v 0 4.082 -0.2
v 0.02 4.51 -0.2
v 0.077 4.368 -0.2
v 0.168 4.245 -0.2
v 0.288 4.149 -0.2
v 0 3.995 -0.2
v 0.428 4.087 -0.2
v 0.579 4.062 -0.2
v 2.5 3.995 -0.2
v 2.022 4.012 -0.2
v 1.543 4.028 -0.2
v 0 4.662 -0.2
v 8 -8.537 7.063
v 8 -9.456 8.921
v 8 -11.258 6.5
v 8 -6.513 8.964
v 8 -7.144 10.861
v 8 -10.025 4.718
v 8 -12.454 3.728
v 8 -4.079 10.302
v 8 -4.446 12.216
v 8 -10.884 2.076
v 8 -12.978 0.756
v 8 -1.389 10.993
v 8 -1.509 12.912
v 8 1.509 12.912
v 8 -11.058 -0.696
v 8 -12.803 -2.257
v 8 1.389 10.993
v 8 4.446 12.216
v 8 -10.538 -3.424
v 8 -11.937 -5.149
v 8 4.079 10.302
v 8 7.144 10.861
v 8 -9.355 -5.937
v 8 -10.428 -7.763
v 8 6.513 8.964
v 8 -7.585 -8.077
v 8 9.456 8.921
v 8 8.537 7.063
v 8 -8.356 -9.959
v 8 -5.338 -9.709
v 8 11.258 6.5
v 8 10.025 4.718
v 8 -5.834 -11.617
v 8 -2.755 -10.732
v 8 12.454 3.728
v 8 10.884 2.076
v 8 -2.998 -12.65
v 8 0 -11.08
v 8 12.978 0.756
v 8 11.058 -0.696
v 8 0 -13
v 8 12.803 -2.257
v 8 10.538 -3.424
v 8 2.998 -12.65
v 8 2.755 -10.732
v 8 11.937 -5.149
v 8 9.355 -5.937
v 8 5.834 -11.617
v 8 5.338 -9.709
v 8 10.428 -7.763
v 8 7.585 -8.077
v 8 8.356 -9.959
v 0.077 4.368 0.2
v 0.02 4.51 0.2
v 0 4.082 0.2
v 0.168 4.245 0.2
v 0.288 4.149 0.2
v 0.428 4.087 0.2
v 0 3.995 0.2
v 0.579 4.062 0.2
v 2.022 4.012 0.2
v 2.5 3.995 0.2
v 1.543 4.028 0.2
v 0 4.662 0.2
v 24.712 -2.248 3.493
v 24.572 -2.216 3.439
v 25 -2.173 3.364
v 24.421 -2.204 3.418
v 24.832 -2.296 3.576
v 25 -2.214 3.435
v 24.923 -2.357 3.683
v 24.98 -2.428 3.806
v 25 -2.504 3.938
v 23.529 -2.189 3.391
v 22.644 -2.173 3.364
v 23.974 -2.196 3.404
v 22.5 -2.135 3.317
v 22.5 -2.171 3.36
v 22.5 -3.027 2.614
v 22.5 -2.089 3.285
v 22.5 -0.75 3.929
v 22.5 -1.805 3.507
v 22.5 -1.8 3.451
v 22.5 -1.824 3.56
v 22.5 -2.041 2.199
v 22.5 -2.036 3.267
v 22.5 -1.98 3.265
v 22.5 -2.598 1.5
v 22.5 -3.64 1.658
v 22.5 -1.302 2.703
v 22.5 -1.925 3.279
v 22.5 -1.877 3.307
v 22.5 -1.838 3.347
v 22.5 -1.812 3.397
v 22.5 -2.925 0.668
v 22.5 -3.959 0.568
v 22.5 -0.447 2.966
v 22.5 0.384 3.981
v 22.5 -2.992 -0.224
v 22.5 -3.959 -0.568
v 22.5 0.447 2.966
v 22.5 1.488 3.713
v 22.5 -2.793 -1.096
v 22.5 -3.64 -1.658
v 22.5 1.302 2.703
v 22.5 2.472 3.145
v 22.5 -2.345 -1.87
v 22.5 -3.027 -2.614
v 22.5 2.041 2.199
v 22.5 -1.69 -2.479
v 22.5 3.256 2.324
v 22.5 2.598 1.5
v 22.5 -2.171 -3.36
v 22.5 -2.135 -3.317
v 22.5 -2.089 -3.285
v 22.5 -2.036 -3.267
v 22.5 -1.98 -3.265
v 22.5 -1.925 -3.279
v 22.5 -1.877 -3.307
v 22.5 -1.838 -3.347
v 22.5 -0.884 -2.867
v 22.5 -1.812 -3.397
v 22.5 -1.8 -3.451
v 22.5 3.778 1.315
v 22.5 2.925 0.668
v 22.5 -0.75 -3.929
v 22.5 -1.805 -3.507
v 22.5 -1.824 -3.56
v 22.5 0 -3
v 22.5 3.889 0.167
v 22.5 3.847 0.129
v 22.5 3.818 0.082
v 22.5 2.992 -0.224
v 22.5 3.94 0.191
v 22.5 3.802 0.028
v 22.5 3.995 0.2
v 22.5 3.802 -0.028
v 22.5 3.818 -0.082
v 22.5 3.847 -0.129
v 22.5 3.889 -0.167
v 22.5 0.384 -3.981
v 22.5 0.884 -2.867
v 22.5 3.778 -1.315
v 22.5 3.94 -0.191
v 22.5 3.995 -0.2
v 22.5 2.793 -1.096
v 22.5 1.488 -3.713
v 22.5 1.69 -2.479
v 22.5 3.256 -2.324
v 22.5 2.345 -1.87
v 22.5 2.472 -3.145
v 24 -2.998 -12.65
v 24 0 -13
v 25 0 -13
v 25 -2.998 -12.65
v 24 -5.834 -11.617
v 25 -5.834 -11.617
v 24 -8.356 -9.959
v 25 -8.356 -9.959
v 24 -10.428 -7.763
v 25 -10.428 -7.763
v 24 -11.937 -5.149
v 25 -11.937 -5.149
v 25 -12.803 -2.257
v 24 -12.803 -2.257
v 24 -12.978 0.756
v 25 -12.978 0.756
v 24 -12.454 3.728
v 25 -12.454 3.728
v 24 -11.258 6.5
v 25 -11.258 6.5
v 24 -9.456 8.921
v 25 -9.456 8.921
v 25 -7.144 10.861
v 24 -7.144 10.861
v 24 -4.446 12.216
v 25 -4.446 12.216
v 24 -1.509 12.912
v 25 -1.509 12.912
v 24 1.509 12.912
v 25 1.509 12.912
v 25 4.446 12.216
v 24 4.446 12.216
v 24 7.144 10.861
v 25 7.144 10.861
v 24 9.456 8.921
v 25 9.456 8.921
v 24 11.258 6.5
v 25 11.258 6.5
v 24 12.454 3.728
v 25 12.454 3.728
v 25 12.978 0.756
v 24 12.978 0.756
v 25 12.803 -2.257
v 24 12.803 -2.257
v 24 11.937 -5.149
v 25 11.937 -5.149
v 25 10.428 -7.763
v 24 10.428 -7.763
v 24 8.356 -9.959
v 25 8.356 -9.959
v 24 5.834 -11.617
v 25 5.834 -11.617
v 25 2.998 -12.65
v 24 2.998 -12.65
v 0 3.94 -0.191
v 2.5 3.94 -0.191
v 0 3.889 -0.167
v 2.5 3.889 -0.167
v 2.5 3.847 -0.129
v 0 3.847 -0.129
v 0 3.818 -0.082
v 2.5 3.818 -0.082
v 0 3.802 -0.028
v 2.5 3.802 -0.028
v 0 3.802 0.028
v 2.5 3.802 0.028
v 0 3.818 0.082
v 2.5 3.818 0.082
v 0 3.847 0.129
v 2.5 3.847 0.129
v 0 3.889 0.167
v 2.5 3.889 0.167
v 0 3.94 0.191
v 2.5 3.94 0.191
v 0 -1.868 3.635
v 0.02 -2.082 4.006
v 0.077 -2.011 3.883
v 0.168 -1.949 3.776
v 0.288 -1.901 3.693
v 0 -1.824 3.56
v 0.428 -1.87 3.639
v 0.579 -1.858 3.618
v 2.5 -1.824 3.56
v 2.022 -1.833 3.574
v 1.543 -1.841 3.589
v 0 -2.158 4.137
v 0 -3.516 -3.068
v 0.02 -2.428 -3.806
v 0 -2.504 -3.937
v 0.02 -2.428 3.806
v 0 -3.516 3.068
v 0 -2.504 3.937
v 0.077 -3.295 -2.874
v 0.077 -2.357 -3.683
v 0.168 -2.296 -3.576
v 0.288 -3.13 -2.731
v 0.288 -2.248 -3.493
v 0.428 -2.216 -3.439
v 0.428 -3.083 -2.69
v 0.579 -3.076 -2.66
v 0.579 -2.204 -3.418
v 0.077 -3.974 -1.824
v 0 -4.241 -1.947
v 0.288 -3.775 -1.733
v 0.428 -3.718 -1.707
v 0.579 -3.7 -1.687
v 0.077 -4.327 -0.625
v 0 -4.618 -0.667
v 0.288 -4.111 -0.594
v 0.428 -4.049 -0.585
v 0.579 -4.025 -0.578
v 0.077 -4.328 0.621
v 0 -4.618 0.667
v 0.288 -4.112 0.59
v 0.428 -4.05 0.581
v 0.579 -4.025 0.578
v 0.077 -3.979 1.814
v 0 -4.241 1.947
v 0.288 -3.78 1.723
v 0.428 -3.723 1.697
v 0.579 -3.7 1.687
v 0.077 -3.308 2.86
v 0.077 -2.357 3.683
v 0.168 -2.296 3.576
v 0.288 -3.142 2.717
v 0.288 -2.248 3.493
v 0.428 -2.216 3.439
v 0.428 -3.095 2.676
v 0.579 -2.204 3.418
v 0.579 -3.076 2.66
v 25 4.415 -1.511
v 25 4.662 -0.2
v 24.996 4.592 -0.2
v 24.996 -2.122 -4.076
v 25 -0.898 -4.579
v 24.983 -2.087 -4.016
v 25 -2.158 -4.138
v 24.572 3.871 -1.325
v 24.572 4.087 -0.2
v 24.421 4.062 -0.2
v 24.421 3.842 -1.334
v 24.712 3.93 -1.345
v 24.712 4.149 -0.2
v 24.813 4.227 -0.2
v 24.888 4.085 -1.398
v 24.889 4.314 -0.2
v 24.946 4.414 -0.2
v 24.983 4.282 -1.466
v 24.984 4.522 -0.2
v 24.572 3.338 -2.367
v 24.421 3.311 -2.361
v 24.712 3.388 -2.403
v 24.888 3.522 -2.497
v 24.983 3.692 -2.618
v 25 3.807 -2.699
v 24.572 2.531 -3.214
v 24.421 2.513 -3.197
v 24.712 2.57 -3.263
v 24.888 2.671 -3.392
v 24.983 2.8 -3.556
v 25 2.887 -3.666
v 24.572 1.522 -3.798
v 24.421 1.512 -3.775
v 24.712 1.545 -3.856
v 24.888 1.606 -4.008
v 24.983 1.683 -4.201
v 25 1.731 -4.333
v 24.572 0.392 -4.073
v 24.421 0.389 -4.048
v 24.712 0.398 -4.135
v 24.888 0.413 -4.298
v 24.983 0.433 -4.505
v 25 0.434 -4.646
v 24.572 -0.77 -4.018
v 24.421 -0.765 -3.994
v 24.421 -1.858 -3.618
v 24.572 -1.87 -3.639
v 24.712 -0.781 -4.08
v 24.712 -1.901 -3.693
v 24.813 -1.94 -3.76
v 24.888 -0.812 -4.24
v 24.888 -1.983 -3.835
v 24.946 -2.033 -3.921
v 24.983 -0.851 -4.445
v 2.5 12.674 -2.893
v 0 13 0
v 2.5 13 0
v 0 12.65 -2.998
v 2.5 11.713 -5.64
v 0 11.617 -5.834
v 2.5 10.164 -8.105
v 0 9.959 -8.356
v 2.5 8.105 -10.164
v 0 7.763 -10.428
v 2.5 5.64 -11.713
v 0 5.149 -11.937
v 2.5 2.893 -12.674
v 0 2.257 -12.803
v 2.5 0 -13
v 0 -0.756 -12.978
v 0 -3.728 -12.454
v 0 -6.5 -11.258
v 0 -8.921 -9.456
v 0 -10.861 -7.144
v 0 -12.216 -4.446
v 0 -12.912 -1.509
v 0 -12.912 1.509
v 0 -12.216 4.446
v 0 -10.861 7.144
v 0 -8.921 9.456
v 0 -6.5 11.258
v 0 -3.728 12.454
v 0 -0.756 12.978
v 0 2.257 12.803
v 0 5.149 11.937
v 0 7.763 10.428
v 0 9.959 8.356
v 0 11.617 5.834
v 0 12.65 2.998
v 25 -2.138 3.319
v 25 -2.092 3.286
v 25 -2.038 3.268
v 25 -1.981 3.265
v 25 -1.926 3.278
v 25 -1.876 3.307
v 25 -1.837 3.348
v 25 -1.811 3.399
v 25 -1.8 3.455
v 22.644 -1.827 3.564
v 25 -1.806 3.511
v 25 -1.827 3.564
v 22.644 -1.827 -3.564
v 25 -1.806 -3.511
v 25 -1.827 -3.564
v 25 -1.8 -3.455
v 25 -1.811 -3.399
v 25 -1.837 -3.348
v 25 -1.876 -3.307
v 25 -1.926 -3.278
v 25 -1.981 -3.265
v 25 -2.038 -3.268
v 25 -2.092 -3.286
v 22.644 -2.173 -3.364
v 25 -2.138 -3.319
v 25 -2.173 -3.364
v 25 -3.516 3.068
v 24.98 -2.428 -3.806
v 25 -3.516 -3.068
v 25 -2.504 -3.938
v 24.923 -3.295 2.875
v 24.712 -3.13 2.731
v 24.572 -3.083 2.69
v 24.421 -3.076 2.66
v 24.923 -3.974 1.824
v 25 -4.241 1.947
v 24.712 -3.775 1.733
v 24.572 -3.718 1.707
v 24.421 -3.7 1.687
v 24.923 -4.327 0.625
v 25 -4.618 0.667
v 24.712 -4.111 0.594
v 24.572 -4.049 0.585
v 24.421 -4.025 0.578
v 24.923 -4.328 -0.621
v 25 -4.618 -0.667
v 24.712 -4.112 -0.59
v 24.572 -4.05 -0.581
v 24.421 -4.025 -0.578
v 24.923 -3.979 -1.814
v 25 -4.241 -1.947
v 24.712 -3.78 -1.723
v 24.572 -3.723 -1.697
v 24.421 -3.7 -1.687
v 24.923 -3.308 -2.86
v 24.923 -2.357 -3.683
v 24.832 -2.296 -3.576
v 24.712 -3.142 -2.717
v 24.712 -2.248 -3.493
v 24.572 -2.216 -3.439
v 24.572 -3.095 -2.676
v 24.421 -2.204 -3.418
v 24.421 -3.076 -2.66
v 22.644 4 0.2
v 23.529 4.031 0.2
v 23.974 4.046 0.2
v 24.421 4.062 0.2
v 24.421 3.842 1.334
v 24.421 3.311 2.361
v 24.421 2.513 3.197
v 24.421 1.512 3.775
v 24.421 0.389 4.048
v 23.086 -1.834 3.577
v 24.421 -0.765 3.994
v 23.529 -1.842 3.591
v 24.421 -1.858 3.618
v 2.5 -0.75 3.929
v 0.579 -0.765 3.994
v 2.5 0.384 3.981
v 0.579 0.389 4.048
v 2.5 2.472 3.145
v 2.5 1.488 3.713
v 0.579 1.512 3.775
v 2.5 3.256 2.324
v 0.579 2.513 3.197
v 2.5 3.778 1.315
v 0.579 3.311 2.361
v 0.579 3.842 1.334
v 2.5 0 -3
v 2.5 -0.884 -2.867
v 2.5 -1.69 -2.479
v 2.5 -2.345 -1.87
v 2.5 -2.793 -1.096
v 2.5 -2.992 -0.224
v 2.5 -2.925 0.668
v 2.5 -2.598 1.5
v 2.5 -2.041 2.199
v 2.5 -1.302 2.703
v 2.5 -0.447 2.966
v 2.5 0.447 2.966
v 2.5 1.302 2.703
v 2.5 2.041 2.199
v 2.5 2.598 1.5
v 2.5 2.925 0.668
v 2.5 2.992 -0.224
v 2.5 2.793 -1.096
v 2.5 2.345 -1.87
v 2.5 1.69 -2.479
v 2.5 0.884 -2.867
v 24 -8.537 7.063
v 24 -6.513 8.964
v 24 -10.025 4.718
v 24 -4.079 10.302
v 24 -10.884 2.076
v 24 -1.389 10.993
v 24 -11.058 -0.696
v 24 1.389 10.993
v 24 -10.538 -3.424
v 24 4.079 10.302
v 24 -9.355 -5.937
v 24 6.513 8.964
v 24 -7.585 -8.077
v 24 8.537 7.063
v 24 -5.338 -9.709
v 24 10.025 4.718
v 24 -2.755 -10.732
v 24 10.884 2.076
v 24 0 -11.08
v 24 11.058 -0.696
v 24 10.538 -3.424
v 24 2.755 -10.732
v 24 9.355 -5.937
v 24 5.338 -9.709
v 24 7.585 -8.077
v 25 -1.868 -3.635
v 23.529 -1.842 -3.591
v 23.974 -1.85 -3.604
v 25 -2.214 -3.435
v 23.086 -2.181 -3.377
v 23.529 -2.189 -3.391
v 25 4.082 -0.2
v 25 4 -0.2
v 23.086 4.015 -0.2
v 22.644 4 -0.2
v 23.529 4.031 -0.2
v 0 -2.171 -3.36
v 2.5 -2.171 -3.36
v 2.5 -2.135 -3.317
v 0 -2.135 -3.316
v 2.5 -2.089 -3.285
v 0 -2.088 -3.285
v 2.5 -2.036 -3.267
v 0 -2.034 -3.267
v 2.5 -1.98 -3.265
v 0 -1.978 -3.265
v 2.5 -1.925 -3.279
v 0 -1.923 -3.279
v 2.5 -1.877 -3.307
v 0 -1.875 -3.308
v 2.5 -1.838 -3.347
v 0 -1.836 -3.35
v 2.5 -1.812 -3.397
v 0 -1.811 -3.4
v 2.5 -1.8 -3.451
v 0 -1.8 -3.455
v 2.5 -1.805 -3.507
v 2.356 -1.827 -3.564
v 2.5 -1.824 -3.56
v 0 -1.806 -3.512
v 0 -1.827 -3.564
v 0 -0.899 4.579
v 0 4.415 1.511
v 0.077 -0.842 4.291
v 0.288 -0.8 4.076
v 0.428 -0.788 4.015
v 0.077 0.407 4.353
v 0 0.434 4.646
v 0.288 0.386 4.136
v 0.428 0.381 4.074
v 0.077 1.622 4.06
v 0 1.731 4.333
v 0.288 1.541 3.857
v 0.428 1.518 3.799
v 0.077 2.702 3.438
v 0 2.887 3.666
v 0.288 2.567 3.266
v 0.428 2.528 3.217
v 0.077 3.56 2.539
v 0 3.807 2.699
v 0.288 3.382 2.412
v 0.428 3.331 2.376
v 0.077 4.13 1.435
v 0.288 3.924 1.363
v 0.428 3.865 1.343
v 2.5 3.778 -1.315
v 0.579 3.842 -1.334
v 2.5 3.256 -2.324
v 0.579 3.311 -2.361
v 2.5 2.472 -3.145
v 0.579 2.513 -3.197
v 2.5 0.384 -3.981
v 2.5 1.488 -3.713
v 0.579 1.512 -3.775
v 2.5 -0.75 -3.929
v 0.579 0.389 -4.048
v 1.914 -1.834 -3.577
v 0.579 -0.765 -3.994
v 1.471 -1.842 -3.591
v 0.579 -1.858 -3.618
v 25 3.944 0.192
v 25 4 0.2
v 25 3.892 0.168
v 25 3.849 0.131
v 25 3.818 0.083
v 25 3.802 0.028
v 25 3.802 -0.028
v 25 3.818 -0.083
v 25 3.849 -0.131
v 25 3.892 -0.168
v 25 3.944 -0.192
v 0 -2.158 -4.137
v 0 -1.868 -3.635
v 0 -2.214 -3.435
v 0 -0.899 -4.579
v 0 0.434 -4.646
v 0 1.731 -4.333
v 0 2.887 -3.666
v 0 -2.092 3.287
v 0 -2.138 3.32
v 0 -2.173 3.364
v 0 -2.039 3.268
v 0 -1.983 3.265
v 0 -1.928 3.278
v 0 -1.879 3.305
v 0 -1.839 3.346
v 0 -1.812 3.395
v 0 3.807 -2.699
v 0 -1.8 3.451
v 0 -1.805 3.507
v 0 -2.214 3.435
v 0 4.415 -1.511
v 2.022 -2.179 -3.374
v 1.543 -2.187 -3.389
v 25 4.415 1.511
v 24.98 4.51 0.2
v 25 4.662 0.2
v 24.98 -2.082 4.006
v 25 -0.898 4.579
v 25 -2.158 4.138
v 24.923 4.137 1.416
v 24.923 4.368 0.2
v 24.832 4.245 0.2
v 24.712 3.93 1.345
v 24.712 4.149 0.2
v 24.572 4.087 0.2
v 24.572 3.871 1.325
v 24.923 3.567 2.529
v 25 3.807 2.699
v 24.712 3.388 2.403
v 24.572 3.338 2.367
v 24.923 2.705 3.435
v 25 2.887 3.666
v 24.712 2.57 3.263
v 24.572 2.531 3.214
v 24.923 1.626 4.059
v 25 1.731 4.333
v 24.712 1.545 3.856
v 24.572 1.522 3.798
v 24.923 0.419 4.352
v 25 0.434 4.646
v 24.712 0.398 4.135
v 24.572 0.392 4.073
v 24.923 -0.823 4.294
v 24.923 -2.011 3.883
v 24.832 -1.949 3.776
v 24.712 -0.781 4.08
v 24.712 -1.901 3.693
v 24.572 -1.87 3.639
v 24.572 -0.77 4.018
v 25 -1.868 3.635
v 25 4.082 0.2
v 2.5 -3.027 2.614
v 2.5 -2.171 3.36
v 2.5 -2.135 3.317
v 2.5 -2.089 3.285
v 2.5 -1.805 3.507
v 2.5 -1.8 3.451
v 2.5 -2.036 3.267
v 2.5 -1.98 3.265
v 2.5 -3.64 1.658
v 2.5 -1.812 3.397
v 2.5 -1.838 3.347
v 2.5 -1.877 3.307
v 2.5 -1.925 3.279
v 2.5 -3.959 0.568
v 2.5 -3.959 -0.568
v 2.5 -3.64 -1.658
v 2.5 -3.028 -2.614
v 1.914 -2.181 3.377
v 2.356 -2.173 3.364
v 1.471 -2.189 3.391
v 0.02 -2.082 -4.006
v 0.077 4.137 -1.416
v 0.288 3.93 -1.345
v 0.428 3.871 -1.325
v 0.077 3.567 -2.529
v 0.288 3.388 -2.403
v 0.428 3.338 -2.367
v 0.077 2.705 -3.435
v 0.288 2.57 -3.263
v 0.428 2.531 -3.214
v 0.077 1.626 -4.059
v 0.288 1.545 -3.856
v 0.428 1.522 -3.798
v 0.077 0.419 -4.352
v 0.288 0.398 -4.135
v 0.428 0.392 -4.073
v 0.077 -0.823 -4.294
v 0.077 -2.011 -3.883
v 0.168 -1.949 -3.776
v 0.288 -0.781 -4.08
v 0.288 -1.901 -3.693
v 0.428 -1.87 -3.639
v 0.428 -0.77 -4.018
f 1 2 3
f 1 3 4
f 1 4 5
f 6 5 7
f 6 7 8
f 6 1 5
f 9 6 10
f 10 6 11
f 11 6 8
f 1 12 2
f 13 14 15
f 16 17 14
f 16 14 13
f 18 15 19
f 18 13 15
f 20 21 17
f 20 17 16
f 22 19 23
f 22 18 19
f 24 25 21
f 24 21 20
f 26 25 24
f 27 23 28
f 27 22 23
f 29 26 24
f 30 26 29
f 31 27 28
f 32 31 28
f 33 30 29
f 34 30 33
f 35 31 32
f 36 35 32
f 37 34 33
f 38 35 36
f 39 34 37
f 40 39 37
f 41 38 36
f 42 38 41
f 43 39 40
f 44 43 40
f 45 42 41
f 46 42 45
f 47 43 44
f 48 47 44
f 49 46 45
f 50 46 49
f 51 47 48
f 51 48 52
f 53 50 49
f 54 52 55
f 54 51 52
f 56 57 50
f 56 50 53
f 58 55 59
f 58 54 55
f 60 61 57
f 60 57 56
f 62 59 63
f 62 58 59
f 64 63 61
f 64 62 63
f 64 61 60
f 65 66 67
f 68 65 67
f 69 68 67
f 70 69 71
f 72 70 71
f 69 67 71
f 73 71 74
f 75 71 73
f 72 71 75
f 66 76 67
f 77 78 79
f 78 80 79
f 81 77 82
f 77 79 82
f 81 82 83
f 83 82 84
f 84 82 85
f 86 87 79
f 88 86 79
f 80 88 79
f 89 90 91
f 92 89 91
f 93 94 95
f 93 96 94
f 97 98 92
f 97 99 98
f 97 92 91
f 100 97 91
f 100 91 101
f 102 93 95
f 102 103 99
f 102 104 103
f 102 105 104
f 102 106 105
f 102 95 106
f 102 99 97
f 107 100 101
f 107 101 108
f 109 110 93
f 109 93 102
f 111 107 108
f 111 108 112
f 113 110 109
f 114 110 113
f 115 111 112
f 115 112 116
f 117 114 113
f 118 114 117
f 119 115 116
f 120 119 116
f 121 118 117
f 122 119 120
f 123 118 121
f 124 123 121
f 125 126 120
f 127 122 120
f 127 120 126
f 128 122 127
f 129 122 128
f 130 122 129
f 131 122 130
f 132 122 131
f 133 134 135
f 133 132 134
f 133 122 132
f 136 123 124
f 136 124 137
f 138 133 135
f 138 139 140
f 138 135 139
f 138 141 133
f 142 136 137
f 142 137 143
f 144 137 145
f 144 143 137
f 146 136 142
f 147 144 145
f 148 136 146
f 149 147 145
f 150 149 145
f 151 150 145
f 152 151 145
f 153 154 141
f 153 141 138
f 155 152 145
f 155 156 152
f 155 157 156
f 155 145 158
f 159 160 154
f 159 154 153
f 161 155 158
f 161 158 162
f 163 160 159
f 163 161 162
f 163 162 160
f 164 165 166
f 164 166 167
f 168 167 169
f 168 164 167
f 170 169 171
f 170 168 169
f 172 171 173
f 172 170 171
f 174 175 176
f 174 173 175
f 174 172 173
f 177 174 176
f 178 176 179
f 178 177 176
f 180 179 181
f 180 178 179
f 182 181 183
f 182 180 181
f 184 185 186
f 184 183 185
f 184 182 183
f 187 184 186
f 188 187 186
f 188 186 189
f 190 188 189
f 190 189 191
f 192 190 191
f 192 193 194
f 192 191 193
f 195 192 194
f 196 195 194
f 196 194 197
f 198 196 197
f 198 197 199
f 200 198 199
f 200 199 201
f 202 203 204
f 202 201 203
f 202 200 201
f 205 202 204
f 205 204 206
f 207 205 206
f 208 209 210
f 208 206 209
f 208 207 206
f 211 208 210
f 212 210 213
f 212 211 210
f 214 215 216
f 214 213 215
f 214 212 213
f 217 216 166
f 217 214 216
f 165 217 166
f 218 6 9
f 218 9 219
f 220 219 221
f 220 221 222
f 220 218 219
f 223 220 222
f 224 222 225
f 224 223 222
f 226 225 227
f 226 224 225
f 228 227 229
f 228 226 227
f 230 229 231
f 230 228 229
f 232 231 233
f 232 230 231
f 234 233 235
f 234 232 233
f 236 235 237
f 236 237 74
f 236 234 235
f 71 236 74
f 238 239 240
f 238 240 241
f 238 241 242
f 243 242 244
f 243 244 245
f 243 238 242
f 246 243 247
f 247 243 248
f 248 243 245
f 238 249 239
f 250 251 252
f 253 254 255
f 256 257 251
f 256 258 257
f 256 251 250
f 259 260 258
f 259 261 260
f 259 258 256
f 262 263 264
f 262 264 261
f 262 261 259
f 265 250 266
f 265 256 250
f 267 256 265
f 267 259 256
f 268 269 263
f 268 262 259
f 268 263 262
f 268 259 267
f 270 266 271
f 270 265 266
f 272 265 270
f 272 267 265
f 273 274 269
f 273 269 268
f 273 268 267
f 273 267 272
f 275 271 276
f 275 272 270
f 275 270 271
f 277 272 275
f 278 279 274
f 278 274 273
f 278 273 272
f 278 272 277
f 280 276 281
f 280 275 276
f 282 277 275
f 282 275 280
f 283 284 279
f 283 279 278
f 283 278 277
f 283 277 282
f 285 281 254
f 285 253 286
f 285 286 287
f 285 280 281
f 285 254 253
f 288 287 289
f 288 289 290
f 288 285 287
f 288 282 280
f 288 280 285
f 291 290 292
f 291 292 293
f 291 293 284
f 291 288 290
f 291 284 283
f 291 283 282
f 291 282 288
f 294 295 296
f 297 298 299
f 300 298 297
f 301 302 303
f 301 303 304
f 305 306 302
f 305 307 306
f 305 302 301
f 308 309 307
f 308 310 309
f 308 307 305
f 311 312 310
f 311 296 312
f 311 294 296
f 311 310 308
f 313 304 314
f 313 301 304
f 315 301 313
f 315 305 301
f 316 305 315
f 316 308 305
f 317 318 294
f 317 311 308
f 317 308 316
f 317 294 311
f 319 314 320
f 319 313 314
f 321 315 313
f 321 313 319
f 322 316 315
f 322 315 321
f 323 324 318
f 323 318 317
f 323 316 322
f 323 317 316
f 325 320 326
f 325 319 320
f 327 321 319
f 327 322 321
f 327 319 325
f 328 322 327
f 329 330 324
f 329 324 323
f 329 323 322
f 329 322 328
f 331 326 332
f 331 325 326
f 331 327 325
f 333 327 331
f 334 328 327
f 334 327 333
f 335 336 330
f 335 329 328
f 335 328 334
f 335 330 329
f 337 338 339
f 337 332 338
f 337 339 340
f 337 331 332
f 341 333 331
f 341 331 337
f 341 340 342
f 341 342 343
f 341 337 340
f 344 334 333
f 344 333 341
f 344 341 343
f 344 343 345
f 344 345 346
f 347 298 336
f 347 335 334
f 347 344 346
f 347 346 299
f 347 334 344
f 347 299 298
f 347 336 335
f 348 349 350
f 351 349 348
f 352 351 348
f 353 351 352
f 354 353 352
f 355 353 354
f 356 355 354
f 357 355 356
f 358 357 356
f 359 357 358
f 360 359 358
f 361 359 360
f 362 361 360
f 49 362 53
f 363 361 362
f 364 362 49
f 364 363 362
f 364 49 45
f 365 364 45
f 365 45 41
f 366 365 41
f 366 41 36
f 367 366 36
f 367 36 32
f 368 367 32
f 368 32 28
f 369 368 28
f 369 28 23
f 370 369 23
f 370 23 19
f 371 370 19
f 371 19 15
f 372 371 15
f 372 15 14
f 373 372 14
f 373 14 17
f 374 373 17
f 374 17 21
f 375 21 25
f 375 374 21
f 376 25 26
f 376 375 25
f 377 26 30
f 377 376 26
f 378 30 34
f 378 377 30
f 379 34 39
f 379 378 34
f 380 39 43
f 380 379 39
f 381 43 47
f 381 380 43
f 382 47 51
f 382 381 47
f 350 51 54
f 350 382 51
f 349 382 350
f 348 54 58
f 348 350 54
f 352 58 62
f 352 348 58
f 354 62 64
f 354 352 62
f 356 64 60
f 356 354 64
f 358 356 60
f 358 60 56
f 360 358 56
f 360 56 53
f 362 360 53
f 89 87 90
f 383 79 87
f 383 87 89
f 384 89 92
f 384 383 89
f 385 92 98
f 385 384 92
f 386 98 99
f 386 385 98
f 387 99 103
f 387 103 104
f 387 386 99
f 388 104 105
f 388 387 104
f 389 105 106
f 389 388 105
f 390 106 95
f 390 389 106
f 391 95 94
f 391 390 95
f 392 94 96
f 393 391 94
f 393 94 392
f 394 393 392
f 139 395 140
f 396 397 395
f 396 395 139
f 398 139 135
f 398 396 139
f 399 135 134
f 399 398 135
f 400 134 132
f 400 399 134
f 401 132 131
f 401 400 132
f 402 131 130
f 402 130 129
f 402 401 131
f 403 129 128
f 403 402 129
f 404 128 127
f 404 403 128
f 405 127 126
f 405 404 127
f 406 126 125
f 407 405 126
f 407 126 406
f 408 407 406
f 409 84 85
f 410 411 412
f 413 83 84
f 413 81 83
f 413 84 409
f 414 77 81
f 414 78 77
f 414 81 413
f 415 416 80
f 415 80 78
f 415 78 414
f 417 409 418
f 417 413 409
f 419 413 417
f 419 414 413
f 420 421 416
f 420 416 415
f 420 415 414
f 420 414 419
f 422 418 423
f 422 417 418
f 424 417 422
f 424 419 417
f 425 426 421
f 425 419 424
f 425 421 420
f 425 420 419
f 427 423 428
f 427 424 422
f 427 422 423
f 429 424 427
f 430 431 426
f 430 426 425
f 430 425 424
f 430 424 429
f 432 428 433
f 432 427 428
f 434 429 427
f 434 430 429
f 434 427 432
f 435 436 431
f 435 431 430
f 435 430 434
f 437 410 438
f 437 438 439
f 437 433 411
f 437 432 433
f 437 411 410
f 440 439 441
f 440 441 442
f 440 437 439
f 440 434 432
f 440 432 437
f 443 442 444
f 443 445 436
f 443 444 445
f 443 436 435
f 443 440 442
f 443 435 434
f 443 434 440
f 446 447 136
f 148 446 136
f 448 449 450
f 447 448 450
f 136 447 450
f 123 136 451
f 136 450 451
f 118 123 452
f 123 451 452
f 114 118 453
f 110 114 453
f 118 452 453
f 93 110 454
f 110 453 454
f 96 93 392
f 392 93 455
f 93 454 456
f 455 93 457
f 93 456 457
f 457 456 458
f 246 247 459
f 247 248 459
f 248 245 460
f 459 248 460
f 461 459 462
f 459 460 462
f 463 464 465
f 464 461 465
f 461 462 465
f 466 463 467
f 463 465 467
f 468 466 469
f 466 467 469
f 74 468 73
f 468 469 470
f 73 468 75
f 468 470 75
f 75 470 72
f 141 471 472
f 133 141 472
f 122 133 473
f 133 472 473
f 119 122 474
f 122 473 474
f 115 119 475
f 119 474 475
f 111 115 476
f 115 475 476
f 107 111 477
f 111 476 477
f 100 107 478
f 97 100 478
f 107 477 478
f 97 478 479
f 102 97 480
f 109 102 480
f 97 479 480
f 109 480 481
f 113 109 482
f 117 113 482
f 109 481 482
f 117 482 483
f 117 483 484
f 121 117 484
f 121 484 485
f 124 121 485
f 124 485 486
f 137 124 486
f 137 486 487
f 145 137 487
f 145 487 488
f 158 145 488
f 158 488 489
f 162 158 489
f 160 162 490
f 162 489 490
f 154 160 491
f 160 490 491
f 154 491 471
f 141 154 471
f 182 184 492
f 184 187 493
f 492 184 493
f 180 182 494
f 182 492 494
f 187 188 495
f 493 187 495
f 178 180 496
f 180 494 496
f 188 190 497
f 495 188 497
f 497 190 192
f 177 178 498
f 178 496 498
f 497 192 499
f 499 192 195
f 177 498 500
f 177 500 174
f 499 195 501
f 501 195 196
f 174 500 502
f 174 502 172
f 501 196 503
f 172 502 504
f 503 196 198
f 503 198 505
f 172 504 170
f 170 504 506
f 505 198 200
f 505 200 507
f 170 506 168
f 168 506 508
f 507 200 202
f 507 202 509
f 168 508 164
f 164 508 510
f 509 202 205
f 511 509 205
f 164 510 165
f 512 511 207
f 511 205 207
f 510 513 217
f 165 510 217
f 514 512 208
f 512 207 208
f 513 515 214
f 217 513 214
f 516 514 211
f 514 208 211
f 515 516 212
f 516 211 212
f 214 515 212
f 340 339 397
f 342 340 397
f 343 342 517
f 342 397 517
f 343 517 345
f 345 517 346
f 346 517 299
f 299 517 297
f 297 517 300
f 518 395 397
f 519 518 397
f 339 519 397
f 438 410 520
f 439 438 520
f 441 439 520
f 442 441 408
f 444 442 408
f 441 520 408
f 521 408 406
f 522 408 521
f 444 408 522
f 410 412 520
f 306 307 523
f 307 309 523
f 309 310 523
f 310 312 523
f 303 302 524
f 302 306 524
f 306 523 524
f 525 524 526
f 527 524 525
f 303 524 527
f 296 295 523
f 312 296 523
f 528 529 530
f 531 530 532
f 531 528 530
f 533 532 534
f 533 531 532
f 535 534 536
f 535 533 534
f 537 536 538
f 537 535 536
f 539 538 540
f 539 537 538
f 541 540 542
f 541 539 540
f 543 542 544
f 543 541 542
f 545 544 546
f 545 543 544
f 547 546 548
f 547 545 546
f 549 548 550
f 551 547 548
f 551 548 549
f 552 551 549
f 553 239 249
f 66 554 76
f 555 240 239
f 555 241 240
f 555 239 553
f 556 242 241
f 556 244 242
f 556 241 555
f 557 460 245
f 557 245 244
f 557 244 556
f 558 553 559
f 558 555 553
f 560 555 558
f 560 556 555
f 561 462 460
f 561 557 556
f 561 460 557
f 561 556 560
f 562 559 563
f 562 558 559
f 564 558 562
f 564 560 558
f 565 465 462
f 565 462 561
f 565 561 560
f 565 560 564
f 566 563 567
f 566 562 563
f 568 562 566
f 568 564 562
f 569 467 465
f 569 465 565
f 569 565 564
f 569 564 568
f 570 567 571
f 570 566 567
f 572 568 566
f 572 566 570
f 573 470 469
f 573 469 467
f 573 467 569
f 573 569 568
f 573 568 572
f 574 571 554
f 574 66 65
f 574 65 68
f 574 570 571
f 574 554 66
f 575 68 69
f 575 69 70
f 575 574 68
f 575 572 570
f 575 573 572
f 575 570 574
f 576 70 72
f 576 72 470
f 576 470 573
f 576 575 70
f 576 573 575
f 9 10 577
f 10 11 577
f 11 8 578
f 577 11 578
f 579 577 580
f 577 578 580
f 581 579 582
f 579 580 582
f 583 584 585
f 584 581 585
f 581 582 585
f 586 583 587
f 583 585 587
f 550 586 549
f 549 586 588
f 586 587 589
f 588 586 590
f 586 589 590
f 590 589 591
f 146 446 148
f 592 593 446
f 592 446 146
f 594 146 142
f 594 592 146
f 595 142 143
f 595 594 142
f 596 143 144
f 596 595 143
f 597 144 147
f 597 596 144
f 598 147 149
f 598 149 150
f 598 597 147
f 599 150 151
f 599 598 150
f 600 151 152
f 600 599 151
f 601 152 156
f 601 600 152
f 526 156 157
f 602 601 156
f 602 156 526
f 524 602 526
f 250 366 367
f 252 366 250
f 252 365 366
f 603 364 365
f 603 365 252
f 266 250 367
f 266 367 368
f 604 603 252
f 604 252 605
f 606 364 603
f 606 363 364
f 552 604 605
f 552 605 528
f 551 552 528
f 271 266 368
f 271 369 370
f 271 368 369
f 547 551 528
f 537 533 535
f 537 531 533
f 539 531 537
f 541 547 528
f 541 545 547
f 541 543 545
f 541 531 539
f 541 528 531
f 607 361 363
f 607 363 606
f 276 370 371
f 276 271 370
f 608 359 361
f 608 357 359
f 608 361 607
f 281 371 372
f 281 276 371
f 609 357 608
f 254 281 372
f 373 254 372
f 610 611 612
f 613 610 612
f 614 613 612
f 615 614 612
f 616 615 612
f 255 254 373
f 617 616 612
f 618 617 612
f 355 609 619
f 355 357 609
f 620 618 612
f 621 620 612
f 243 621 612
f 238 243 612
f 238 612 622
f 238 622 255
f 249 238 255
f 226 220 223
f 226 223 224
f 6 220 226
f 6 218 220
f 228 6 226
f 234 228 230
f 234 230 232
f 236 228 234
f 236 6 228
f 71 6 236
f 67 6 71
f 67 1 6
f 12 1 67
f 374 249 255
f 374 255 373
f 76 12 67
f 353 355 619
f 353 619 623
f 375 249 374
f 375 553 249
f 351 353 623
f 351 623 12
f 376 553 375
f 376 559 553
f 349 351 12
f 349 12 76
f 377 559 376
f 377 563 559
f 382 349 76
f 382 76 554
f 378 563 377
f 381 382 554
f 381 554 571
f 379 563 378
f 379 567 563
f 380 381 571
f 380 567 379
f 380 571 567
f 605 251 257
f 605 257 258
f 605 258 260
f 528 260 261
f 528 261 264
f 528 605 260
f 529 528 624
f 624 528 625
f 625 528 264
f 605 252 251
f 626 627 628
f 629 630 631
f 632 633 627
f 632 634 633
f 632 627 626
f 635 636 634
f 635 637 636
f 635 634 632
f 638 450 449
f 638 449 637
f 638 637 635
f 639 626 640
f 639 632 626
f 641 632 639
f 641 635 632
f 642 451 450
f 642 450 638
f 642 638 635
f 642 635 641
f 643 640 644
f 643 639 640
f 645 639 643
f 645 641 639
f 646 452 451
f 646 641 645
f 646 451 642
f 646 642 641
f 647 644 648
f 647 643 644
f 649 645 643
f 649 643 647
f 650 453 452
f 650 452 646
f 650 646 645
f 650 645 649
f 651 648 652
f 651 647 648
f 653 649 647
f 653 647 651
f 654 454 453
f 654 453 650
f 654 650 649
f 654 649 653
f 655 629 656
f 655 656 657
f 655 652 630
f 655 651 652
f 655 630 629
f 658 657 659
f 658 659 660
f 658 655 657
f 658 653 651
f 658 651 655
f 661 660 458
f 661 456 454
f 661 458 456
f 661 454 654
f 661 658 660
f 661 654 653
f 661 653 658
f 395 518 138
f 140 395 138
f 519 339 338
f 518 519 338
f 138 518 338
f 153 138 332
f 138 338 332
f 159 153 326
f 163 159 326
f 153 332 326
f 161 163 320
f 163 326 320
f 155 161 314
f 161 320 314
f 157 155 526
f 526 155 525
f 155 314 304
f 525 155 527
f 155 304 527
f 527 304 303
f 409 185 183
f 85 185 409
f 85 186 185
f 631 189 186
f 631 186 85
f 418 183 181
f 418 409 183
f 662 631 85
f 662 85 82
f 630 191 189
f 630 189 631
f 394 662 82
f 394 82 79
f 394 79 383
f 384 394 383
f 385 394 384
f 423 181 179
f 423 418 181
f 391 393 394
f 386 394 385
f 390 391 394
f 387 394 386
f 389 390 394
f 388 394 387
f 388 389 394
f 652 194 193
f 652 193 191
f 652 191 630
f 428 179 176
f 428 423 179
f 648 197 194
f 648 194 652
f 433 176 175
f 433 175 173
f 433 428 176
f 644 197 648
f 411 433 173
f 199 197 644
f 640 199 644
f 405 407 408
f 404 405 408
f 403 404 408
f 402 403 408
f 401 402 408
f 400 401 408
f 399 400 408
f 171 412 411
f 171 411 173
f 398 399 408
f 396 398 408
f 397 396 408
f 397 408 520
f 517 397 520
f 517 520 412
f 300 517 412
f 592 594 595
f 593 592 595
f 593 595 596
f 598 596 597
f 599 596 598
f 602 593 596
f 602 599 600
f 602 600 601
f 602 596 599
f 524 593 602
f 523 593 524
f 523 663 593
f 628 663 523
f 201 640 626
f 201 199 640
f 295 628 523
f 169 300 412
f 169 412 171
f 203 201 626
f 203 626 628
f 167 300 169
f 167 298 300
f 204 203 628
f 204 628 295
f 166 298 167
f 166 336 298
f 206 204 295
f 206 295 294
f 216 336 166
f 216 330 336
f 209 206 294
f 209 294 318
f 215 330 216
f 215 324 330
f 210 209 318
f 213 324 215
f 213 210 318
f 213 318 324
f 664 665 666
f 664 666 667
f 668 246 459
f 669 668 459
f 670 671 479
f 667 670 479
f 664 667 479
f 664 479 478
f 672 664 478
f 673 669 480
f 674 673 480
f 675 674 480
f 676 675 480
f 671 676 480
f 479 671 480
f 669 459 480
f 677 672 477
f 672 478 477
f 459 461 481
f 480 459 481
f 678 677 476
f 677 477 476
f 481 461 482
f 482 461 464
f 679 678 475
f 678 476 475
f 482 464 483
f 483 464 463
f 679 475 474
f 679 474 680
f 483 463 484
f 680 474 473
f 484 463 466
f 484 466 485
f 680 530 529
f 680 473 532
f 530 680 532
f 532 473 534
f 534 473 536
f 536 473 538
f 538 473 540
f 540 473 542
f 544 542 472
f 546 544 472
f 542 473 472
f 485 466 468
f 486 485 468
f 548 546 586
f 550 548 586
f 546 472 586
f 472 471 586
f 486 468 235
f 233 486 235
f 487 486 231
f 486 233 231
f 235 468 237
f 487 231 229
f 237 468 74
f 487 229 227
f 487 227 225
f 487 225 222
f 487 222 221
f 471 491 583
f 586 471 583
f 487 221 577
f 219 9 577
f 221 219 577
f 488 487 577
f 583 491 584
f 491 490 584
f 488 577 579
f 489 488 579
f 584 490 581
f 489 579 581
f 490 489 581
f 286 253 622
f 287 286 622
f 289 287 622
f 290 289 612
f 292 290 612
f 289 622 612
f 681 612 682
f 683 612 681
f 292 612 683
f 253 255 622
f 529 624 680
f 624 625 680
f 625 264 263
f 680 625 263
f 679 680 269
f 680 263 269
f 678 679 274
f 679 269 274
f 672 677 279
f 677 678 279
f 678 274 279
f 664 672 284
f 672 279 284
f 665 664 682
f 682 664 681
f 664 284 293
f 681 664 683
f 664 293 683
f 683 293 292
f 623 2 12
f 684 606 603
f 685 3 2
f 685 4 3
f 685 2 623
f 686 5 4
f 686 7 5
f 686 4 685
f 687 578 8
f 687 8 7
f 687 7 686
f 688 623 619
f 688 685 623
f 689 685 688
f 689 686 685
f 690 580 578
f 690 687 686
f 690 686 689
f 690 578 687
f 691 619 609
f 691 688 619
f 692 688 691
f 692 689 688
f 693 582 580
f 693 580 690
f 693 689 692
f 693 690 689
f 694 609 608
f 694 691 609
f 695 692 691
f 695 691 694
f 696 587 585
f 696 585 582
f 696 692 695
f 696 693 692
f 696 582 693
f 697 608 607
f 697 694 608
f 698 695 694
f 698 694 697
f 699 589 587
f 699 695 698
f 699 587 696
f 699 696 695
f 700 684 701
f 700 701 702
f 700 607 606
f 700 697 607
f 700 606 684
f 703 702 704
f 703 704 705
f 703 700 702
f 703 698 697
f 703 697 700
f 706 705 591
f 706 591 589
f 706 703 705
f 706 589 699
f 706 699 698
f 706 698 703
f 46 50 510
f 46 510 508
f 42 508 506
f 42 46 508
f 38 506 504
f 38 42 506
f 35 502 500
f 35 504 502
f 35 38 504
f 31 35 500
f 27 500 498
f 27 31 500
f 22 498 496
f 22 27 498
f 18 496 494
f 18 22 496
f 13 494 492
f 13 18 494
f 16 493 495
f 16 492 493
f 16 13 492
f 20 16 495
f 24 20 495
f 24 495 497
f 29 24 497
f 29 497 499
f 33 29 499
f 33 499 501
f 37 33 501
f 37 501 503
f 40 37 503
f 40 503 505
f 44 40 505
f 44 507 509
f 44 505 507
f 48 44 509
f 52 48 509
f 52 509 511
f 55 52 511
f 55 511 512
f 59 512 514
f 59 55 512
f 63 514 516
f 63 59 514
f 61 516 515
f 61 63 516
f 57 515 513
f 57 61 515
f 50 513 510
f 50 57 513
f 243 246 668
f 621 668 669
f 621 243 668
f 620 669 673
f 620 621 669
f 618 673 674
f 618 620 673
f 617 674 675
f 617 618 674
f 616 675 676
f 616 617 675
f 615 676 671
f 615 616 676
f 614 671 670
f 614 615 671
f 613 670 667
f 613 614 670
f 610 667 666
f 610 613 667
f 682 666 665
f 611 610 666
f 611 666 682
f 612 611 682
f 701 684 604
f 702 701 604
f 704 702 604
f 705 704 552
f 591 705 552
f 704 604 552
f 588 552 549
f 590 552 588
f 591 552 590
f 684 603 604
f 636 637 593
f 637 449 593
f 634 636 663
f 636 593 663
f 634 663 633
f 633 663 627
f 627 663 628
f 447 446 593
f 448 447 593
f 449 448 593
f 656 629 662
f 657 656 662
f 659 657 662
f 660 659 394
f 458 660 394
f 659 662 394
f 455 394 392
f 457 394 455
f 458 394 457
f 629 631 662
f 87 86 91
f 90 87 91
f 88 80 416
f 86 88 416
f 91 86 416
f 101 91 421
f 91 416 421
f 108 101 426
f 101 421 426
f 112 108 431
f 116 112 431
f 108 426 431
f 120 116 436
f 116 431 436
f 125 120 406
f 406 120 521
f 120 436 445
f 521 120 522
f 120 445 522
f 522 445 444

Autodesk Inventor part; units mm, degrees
ref_plane "YZ Plane" through (0, 0, 0) normal (1, 0, 0) x (0, 1, 0)
ref_plane "XZ Plane" through (0, 0, 0) normal (0, 1, 0) x (-1, 0, 0)
ref_plane "XY Plane" through (0, 0, 0) normal (0, 0, 1) x (1, 0, 0)
sketch "Sketch1" plane through (0, 0, 0) normal (1, 0, 0) x (0, 1, 0)
  circle A0 centre (0, 0) radius 4
  circle A1 centre (0, 0) radius 13
  dimension "d0" = 8
  dimension "d1" = 26
extrude "Extrusion1" add sketch "Sketch1" along normal blind 2.5
sketch "Sketch2" plane through (2.5, 0, 0) normal (1, 0, 0) x (0, 0, -1)
  circle A0 centre (0, 0) radius 3
  circle A1 centre (0, 0) radius 13
  dimension "d4" = 6
extrude "Extrusion2" add sketch "Sketch2" along normal blind 5.5
sketch "Sketch3" plane through (8, 0, 0) normal (1, 0, 0) x (0, 0, -1)
  circle A0 centre (0, 0) radius 3 projected
  circle A1 centre (0, 0) radius 11.08
  dimension "d7" = 22.16
extrude "Extrusion3" add sketch "Sketch3" along normal blind 16
sketch "Sketch4" plane through (24, 0, 0) normal (1, 0, 0) x (0, 0, -1)
  circle A0 centre (0, 0) radius 13 projected
  circle A1 centre (0, 0) radius 3 projected
extrude "Extrusion4" add sketch "Sketch4" along normal blind 1
sketch "Sketch5" plane through (25, 0, 0) normal (1, 0, 0) x (0, 0, -1)
  circle A0 centre (0, 0) radius 4
  dimension "d12" = 8
extrude "Extrusion5" cut sketch "Sketch5" against normal blind 2.5
chamfer "Chamfer1" distance 2.5 angle 2 1 edges at (0, -4, 0) measured on face at (1.6667, 3.9482, -0.6416)
chamfer "Chamfer2" distance 2.5 angle 2 1 edges at (25, 0, 4) measured on face at (23.3333, -0.6416, -3.9482)
sketch "Sketch6" plane through (0, 0, 0) normal (-1, 0, 0) x (0, 0, 1)
  line L0 (0.2, 4.0824) -> (0.2, 3.995)
  line L1 (-0.2, 4.0824) -> (-0.2, 3.995)
  line L2 (0, 0) -> (0, 3.9651) construction
  circle A0 centre (0, 0) radius 4 construction
  arc A1 (-0.2, 4) -> (0.2, 4) centre (0, 4) ccw
  circle A2 centre (0, 0) radius 4.0873 projected
  line L3 (-3.4355, -2.2144) -> (-3.3598, -2.1707)
  arc A3 (-3.3641, -2.1732) -> (-3.5641, -1.8268) centre (-3.4641, -2) ccw
  line L4 (-3.6355, -1.868) -> (-3.5598, -1.8243)
  line L5 (3.6355, -1.868) -> (3.5598, -1.8243)
  arc A4 (3.5641, -1.8268) -> (3.3641, -2.1732) centre (3.4641, -2) ccw
  line L6 (3.4355, -2.2144) -> (3.3598, -2.1707)
  dimension "d21" = 0.2
  dimension "d22" = 0.2
  dimension "d23" = 0.4
  dimension "d26" = 360
extrude "Extrusion6" add sketch "Sketch6" against normal blind 2.5 contours L0 A1 L1 A2 | A2 L6 A4 L5 | L4 A3 L3 A2
sketch "Sketch7" plane through (25, 0, 0) normal (1, 0, 0) x (0, 0, -1)
  circle A0 centre (0, 0) radius 13 projected
  arc A1 (-0.2, 4.0824) -> (-3.6355, -1.868) centre (0, 0) ccw projected
  line L0 (-3.6355, -1.868) -> (-3.5641, -1.8268) projected
  arc A2 (-3.3641, -2.1732) -> (-3.5641, -1.8268) centre (-3.4641, -2) ccw projected
  line L1 (-3.3641, -2.1732) -> (-3.4355, -2.2144) projected
  arc A3 (-3.4355, -2.2144) -> (3.4355, -2.2144) centre (0, 0) ccw projected
  line L2 (3.4355, -2.2144) -> (3.3641, -2.1732) projected
  arc A4 (3.5641, -1.8268) -> (3.3641, -2.1732) centre (3.4641, -2) ccw projected
  line L3 (3.5641, -1.8268) -> (3.6355, -1.868) projected
  arc A5 (3.6355, -1.868) -> (0.2, 4.0824) centre (0, 0) ccw projected
  line L4 (0.2, 4.0824) -> (0.2, 4) projected
  arc A6 (-0.2, 4) -> (0.2, 4) centre (0, 4) ccw projected
  line L5 (-0.2, 4) -> (-0.2, 4.0824) projected
  circle A7 centre (0, 0) radius 13 projected
  circle A8 centre (0, 0) radius 4.0873 projected
  point P0 (3.4355, -2.2144)
  point P1 (-3.6355, -1.868)
  point P2 (0.2, 4.0824)
  point P3 (-0.2, 4.0824)
extrude "Extrusion7" add sketch "Sketch7" against normal blind 2.5 contours A8 L4 A6 L5 | L0 A2 L1 A8 | L2 A4 L3 A8
fillet "Fillet1" radius 0.6 6 edges at (25, 2.0434, -3.5393) (25, -4.0868, 0) (25, 2.0434, 3.5393) (0, 2.0434, -3.5393) (0, 2.0434, 3.5393) (0, -4.0868, 0)
properties part number "8mm ID 15mm Deep Idler Pully"
